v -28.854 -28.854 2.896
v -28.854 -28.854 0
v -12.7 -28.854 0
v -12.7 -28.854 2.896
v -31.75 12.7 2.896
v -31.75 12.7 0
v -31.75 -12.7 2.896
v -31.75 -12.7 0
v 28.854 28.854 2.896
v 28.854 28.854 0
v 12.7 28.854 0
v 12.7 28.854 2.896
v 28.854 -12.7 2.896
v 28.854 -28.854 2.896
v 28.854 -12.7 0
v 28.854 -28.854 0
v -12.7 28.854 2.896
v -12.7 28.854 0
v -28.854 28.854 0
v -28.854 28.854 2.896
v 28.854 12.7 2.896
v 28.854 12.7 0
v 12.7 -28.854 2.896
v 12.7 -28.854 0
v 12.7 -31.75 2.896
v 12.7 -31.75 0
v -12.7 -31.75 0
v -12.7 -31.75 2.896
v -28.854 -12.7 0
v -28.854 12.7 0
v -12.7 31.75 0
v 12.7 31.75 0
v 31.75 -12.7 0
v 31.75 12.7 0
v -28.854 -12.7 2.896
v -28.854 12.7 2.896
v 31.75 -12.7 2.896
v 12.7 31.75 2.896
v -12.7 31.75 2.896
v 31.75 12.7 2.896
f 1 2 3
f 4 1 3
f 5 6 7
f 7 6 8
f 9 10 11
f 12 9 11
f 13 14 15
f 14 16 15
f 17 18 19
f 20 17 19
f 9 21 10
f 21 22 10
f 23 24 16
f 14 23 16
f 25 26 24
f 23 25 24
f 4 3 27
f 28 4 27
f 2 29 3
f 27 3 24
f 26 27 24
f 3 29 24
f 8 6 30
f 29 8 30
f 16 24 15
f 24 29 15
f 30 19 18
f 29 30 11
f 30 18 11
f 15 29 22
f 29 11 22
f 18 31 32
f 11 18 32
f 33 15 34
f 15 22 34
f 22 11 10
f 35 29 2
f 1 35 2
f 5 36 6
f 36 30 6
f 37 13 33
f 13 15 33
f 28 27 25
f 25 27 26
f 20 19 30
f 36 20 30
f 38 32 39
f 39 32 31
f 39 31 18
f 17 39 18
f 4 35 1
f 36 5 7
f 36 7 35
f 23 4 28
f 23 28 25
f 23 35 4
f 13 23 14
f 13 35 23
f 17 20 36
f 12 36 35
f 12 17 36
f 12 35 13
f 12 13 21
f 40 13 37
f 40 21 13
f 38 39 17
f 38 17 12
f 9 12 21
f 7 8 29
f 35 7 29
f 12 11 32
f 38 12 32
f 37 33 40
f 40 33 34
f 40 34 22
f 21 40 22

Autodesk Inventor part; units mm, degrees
ref_plane "YZ Plane" through (0, 0, 0) normal (1, 0, 0) x (0, 1, 0)
ref_plane "XZ Plane" through (0, 0, 0) normal (0, 1, 0) x (-1, 0, 0)
ref_plane "XY Plane" through (0, 0, 0) normal (0, 0, 1) x (1, 0, 0)
sketch "Sketch1" plane through (0, 0, 0) normal (0, 0, 1) x (1, 0, 0)
  line L0 (-28.8544, -12.7) -> (-28.8544, -28.8544)
  line L1 (-28.8544, -28.8544) -> (-12.7, -28.8544)
  line L2 (-12.7, -28.8544) -> (-12.7, -31.75)
  line L3 (-12.7, -31.75) -> (12.7, -31.75)
  line L4 (12.7, -31.75) -> (12.7, -28.8544)
  line L5 (12.7, -28.8544) -> (28.8544, -28.8544)
  line L6 (28.8544, -28.8544) -> (28.8544, -12.7)
  line L7 (28.8544, -12.7) -> (31.75, -12.7)
  line L8 (31.75, -12.7) -> (31.75, 12.7)
  line L9 (31.75, 12.7) -> (28.8544, 12.7)
  line L10 (28.8544, 12.7) -> (28.8544, 28.8544)
  line L11 (28.8544, 28.8544) -> (12.7, 28.8544)
  line L12 (12.7, 28.8544) -> (12.7, 31.75)
  line L13 (12.7, 31.75) -> (-12.7, 31.75)
  line L14 (-12.7, 31.75) -> (-12.7, 28.8544)
  line L15 (-12.7, 28.8544) -> (-28.8544, 28.8544)
  line L16 (-28.8544, 28.8544) -> (-28.8544, 12.7)
  line L17 (-28.8544, 12.7) -> (-31.75, 12.7)
  line L18 (-31.75, 12.7) -> (-31.75, -12.7)
  line L19 (-31.75, -12.7) -> (-28.8544, -12.7)
  point P0 (0, 0)
extrude "Extrusion1" add sketch "Sketch1" along normal blind 2.8956
properties part number "outside_box_front_back" material "Polycarbonate, Clear"
